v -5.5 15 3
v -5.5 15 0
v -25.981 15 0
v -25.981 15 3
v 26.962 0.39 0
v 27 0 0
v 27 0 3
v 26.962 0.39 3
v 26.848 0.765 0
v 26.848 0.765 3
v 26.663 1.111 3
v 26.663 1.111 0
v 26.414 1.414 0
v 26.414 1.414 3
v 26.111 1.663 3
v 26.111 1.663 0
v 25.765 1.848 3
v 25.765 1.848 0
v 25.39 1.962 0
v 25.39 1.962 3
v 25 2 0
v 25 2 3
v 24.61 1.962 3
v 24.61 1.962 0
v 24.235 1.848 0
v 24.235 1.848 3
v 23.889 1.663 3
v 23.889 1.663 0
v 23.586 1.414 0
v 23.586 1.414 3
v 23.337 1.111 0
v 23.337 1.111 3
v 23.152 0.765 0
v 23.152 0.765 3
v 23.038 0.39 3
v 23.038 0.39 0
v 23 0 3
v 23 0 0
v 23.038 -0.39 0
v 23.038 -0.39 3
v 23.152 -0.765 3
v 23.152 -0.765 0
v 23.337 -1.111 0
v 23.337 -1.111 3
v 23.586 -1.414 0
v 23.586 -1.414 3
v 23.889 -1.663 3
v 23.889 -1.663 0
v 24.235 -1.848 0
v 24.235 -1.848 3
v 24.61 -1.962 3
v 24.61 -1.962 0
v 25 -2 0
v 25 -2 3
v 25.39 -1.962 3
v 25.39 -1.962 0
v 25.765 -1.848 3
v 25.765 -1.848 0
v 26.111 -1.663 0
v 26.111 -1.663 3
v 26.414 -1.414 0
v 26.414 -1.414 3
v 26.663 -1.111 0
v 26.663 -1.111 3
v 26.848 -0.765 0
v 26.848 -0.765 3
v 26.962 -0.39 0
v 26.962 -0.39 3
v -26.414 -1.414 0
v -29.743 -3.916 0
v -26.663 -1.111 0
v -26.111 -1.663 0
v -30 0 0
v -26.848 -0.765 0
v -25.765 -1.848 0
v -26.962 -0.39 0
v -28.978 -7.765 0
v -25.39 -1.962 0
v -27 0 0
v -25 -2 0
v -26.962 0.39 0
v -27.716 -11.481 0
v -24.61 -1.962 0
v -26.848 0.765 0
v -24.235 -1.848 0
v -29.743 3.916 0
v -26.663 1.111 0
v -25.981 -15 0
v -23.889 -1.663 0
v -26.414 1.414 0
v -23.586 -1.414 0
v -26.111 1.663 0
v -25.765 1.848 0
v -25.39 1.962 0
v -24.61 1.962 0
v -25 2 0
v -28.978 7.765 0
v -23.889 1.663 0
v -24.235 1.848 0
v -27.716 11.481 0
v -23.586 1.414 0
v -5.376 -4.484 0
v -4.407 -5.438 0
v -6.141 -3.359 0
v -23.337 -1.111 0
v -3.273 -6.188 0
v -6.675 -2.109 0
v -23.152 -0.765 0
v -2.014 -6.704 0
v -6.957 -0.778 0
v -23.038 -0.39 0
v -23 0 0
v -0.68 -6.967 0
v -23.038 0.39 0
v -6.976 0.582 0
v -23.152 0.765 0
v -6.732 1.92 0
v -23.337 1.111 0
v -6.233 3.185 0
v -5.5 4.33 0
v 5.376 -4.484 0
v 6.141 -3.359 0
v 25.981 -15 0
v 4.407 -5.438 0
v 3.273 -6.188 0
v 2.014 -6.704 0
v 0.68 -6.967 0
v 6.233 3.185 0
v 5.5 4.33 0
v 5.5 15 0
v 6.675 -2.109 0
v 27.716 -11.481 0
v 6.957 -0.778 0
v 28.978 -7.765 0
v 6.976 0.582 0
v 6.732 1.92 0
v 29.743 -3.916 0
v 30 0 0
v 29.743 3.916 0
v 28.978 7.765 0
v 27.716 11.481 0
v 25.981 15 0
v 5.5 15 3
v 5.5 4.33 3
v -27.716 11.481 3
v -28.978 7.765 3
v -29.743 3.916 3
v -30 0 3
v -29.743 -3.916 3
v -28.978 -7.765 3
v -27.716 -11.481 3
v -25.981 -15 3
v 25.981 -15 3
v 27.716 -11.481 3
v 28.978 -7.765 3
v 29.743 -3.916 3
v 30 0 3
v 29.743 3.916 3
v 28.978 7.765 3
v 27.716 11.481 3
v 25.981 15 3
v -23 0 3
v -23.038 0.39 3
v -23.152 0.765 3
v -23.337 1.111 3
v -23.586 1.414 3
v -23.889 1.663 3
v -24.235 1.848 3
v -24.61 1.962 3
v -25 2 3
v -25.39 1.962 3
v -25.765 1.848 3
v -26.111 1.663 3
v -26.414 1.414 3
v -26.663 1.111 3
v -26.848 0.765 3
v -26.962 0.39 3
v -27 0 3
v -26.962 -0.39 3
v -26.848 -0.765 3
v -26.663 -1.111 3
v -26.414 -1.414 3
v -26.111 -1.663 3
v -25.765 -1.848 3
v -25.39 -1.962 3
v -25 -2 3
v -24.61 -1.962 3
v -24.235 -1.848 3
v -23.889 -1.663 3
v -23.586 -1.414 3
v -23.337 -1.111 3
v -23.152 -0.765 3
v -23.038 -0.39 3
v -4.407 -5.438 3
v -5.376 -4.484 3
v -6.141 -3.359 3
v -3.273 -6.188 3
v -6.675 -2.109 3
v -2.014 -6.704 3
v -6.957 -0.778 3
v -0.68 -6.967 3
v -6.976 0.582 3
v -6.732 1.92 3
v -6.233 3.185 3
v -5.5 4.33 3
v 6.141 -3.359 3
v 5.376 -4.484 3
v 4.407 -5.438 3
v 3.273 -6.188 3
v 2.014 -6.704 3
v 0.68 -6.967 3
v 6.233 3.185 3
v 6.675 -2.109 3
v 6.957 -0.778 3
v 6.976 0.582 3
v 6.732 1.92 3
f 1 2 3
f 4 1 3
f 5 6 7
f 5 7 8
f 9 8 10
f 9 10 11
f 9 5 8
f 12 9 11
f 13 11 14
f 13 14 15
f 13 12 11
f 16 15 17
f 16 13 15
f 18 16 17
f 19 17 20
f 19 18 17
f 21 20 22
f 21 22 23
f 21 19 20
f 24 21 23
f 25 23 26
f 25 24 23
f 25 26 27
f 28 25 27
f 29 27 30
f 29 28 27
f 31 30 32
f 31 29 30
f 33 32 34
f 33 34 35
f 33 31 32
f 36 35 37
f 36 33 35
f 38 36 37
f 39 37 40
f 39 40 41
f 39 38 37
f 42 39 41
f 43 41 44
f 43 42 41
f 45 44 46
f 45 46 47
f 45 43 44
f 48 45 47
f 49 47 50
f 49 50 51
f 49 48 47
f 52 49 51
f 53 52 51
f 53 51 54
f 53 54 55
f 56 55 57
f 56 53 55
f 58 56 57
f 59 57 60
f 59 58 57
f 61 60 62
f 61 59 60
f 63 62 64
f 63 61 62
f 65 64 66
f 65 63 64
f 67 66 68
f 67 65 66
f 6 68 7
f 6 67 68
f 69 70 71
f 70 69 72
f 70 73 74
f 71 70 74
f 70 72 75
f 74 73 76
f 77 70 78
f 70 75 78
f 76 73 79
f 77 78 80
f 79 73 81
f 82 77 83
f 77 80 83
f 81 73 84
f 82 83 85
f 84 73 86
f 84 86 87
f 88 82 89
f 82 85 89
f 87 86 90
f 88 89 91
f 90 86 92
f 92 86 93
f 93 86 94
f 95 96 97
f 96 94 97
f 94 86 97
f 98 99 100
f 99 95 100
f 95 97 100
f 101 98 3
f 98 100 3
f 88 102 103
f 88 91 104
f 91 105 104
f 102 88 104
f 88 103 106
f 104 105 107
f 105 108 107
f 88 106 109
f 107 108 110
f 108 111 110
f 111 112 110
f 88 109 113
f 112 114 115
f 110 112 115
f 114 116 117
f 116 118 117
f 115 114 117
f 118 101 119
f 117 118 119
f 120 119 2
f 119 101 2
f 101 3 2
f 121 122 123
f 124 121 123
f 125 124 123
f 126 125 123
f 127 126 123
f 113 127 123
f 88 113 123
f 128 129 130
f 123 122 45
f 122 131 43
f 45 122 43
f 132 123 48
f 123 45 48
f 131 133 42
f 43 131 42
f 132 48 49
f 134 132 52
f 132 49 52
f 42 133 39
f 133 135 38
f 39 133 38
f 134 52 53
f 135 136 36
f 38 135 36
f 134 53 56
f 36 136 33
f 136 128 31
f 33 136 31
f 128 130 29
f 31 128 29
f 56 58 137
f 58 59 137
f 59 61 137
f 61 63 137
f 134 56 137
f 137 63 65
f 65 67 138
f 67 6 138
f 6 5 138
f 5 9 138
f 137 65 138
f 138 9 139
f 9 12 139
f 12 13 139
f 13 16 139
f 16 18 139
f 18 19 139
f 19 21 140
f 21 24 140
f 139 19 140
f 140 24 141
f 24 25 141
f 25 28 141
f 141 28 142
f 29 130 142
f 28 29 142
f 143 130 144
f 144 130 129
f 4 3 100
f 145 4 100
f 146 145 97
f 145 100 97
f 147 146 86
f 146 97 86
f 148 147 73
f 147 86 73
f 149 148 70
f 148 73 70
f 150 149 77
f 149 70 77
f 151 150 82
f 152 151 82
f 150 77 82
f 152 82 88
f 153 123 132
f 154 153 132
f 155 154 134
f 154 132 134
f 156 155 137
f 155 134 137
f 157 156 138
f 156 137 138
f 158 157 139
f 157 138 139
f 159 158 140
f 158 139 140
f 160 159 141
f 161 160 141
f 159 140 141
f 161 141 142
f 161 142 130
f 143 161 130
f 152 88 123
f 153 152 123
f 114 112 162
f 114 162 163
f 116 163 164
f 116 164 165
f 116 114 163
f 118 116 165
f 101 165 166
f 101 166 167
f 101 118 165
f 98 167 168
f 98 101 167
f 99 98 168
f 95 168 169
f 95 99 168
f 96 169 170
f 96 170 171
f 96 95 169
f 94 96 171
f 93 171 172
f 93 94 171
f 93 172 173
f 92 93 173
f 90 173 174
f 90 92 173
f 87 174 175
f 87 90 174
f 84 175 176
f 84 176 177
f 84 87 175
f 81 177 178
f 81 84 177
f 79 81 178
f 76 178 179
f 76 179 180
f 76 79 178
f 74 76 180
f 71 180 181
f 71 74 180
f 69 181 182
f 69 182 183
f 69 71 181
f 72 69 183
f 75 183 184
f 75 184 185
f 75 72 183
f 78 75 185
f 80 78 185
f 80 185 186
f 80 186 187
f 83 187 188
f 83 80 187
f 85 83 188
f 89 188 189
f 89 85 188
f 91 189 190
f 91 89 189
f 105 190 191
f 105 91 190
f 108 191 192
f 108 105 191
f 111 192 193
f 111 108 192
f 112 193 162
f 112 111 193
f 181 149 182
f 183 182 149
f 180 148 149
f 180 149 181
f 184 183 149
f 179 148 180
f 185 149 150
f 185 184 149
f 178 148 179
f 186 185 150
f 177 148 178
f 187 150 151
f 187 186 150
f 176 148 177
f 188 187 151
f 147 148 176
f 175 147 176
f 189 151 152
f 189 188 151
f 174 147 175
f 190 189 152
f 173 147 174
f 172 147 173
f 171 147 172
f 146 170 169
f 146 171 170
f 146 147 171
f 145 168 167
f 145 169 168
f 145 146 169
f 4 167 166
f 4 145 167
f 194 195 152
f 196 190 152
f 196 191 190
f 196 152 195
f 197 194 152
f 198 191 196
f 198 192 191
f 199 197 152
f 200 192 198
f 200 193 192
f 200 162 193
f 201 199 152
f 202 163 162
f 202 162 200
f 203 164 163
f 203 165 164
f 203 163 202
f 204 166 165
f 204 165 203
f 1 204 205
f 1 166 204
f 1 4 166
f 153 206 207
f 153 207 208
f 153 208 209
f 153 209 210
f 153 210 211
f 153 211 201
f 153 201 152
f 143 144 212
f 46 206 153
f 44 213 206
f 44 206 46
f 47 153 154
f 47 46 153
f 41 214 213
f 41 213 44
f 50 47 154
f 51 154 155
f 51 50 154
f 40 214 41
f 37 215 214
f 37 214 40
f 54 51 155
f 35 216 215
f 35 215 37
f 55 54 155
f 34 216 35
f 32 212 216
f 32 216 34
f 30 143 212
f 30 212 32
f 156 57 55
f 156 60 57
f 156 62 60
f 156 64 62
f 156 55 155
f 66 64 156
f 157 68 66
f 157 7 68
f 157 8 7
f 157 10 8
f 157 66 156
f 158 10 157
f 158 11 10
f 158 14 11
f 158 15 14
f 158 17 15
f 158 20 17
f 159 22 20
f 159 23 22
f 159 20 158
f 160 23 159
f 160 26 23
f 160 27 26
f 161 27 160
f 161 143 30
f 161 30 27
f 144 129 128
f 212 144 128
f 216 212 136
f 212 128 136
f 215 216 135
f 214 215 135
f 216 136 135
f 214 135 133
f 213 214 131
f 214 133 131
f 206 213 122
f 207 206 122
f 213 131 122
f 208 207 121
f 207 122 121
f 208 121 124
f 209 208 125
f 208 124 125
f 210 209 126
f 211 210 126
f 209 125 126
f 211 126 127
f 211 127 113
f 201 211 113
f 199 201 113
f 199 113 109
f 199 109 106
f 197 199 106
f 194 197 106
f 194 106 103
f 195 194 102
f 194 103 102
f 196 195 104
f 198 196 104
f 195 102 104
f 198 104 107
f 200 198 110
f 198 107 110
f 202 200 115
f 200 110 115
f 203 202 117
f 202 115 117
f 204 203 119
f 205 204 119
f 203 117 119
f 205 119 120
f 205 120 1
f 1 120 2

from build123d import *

# Parameters (mm, degrees)
ESQUISSE1_R        = 2
BOSS_EXTRU_1_DEPTH = 3


with BuildPart() as part:
    # Esquisse1 → Boss.-Extru.1 (new body)
    with BuildSketch(Plane.XY):
        with BuildLine():
            Line((-5.5, 15), (-25.980762114, 15))
            ThreePointArc((-25.980762114, 15), (-30, 0), (-25.980762114, -15))
            Line((-25.980762114, -15), (25.980762114, -15))
            ThreePointArc((25.980762114, -15), (30, 0), (25.980762114, 15))
            Line((25.980762114, 15), (5.5, 15))
            Line((5.5, 15), (5.5, 4.330127019))
            ThreePointArc((5.5, 4.330127019), (0, -7), (-5.5, 4.330127019))
            Line((-5.5, 4.330127019), (-5.5, 15))
        make_face()
        with Locations((-25, 0)):
            Circle(ESQUISSE1_R, mode=Mode.SUBTRACT)
        with Locations((25, 0)):
            Circle(ESQUISSE1_R, mode=Mode.SUBTRACT)
    extrude(amount=BOSS_EXTRU_1_DEPTH)


solid = part.part
